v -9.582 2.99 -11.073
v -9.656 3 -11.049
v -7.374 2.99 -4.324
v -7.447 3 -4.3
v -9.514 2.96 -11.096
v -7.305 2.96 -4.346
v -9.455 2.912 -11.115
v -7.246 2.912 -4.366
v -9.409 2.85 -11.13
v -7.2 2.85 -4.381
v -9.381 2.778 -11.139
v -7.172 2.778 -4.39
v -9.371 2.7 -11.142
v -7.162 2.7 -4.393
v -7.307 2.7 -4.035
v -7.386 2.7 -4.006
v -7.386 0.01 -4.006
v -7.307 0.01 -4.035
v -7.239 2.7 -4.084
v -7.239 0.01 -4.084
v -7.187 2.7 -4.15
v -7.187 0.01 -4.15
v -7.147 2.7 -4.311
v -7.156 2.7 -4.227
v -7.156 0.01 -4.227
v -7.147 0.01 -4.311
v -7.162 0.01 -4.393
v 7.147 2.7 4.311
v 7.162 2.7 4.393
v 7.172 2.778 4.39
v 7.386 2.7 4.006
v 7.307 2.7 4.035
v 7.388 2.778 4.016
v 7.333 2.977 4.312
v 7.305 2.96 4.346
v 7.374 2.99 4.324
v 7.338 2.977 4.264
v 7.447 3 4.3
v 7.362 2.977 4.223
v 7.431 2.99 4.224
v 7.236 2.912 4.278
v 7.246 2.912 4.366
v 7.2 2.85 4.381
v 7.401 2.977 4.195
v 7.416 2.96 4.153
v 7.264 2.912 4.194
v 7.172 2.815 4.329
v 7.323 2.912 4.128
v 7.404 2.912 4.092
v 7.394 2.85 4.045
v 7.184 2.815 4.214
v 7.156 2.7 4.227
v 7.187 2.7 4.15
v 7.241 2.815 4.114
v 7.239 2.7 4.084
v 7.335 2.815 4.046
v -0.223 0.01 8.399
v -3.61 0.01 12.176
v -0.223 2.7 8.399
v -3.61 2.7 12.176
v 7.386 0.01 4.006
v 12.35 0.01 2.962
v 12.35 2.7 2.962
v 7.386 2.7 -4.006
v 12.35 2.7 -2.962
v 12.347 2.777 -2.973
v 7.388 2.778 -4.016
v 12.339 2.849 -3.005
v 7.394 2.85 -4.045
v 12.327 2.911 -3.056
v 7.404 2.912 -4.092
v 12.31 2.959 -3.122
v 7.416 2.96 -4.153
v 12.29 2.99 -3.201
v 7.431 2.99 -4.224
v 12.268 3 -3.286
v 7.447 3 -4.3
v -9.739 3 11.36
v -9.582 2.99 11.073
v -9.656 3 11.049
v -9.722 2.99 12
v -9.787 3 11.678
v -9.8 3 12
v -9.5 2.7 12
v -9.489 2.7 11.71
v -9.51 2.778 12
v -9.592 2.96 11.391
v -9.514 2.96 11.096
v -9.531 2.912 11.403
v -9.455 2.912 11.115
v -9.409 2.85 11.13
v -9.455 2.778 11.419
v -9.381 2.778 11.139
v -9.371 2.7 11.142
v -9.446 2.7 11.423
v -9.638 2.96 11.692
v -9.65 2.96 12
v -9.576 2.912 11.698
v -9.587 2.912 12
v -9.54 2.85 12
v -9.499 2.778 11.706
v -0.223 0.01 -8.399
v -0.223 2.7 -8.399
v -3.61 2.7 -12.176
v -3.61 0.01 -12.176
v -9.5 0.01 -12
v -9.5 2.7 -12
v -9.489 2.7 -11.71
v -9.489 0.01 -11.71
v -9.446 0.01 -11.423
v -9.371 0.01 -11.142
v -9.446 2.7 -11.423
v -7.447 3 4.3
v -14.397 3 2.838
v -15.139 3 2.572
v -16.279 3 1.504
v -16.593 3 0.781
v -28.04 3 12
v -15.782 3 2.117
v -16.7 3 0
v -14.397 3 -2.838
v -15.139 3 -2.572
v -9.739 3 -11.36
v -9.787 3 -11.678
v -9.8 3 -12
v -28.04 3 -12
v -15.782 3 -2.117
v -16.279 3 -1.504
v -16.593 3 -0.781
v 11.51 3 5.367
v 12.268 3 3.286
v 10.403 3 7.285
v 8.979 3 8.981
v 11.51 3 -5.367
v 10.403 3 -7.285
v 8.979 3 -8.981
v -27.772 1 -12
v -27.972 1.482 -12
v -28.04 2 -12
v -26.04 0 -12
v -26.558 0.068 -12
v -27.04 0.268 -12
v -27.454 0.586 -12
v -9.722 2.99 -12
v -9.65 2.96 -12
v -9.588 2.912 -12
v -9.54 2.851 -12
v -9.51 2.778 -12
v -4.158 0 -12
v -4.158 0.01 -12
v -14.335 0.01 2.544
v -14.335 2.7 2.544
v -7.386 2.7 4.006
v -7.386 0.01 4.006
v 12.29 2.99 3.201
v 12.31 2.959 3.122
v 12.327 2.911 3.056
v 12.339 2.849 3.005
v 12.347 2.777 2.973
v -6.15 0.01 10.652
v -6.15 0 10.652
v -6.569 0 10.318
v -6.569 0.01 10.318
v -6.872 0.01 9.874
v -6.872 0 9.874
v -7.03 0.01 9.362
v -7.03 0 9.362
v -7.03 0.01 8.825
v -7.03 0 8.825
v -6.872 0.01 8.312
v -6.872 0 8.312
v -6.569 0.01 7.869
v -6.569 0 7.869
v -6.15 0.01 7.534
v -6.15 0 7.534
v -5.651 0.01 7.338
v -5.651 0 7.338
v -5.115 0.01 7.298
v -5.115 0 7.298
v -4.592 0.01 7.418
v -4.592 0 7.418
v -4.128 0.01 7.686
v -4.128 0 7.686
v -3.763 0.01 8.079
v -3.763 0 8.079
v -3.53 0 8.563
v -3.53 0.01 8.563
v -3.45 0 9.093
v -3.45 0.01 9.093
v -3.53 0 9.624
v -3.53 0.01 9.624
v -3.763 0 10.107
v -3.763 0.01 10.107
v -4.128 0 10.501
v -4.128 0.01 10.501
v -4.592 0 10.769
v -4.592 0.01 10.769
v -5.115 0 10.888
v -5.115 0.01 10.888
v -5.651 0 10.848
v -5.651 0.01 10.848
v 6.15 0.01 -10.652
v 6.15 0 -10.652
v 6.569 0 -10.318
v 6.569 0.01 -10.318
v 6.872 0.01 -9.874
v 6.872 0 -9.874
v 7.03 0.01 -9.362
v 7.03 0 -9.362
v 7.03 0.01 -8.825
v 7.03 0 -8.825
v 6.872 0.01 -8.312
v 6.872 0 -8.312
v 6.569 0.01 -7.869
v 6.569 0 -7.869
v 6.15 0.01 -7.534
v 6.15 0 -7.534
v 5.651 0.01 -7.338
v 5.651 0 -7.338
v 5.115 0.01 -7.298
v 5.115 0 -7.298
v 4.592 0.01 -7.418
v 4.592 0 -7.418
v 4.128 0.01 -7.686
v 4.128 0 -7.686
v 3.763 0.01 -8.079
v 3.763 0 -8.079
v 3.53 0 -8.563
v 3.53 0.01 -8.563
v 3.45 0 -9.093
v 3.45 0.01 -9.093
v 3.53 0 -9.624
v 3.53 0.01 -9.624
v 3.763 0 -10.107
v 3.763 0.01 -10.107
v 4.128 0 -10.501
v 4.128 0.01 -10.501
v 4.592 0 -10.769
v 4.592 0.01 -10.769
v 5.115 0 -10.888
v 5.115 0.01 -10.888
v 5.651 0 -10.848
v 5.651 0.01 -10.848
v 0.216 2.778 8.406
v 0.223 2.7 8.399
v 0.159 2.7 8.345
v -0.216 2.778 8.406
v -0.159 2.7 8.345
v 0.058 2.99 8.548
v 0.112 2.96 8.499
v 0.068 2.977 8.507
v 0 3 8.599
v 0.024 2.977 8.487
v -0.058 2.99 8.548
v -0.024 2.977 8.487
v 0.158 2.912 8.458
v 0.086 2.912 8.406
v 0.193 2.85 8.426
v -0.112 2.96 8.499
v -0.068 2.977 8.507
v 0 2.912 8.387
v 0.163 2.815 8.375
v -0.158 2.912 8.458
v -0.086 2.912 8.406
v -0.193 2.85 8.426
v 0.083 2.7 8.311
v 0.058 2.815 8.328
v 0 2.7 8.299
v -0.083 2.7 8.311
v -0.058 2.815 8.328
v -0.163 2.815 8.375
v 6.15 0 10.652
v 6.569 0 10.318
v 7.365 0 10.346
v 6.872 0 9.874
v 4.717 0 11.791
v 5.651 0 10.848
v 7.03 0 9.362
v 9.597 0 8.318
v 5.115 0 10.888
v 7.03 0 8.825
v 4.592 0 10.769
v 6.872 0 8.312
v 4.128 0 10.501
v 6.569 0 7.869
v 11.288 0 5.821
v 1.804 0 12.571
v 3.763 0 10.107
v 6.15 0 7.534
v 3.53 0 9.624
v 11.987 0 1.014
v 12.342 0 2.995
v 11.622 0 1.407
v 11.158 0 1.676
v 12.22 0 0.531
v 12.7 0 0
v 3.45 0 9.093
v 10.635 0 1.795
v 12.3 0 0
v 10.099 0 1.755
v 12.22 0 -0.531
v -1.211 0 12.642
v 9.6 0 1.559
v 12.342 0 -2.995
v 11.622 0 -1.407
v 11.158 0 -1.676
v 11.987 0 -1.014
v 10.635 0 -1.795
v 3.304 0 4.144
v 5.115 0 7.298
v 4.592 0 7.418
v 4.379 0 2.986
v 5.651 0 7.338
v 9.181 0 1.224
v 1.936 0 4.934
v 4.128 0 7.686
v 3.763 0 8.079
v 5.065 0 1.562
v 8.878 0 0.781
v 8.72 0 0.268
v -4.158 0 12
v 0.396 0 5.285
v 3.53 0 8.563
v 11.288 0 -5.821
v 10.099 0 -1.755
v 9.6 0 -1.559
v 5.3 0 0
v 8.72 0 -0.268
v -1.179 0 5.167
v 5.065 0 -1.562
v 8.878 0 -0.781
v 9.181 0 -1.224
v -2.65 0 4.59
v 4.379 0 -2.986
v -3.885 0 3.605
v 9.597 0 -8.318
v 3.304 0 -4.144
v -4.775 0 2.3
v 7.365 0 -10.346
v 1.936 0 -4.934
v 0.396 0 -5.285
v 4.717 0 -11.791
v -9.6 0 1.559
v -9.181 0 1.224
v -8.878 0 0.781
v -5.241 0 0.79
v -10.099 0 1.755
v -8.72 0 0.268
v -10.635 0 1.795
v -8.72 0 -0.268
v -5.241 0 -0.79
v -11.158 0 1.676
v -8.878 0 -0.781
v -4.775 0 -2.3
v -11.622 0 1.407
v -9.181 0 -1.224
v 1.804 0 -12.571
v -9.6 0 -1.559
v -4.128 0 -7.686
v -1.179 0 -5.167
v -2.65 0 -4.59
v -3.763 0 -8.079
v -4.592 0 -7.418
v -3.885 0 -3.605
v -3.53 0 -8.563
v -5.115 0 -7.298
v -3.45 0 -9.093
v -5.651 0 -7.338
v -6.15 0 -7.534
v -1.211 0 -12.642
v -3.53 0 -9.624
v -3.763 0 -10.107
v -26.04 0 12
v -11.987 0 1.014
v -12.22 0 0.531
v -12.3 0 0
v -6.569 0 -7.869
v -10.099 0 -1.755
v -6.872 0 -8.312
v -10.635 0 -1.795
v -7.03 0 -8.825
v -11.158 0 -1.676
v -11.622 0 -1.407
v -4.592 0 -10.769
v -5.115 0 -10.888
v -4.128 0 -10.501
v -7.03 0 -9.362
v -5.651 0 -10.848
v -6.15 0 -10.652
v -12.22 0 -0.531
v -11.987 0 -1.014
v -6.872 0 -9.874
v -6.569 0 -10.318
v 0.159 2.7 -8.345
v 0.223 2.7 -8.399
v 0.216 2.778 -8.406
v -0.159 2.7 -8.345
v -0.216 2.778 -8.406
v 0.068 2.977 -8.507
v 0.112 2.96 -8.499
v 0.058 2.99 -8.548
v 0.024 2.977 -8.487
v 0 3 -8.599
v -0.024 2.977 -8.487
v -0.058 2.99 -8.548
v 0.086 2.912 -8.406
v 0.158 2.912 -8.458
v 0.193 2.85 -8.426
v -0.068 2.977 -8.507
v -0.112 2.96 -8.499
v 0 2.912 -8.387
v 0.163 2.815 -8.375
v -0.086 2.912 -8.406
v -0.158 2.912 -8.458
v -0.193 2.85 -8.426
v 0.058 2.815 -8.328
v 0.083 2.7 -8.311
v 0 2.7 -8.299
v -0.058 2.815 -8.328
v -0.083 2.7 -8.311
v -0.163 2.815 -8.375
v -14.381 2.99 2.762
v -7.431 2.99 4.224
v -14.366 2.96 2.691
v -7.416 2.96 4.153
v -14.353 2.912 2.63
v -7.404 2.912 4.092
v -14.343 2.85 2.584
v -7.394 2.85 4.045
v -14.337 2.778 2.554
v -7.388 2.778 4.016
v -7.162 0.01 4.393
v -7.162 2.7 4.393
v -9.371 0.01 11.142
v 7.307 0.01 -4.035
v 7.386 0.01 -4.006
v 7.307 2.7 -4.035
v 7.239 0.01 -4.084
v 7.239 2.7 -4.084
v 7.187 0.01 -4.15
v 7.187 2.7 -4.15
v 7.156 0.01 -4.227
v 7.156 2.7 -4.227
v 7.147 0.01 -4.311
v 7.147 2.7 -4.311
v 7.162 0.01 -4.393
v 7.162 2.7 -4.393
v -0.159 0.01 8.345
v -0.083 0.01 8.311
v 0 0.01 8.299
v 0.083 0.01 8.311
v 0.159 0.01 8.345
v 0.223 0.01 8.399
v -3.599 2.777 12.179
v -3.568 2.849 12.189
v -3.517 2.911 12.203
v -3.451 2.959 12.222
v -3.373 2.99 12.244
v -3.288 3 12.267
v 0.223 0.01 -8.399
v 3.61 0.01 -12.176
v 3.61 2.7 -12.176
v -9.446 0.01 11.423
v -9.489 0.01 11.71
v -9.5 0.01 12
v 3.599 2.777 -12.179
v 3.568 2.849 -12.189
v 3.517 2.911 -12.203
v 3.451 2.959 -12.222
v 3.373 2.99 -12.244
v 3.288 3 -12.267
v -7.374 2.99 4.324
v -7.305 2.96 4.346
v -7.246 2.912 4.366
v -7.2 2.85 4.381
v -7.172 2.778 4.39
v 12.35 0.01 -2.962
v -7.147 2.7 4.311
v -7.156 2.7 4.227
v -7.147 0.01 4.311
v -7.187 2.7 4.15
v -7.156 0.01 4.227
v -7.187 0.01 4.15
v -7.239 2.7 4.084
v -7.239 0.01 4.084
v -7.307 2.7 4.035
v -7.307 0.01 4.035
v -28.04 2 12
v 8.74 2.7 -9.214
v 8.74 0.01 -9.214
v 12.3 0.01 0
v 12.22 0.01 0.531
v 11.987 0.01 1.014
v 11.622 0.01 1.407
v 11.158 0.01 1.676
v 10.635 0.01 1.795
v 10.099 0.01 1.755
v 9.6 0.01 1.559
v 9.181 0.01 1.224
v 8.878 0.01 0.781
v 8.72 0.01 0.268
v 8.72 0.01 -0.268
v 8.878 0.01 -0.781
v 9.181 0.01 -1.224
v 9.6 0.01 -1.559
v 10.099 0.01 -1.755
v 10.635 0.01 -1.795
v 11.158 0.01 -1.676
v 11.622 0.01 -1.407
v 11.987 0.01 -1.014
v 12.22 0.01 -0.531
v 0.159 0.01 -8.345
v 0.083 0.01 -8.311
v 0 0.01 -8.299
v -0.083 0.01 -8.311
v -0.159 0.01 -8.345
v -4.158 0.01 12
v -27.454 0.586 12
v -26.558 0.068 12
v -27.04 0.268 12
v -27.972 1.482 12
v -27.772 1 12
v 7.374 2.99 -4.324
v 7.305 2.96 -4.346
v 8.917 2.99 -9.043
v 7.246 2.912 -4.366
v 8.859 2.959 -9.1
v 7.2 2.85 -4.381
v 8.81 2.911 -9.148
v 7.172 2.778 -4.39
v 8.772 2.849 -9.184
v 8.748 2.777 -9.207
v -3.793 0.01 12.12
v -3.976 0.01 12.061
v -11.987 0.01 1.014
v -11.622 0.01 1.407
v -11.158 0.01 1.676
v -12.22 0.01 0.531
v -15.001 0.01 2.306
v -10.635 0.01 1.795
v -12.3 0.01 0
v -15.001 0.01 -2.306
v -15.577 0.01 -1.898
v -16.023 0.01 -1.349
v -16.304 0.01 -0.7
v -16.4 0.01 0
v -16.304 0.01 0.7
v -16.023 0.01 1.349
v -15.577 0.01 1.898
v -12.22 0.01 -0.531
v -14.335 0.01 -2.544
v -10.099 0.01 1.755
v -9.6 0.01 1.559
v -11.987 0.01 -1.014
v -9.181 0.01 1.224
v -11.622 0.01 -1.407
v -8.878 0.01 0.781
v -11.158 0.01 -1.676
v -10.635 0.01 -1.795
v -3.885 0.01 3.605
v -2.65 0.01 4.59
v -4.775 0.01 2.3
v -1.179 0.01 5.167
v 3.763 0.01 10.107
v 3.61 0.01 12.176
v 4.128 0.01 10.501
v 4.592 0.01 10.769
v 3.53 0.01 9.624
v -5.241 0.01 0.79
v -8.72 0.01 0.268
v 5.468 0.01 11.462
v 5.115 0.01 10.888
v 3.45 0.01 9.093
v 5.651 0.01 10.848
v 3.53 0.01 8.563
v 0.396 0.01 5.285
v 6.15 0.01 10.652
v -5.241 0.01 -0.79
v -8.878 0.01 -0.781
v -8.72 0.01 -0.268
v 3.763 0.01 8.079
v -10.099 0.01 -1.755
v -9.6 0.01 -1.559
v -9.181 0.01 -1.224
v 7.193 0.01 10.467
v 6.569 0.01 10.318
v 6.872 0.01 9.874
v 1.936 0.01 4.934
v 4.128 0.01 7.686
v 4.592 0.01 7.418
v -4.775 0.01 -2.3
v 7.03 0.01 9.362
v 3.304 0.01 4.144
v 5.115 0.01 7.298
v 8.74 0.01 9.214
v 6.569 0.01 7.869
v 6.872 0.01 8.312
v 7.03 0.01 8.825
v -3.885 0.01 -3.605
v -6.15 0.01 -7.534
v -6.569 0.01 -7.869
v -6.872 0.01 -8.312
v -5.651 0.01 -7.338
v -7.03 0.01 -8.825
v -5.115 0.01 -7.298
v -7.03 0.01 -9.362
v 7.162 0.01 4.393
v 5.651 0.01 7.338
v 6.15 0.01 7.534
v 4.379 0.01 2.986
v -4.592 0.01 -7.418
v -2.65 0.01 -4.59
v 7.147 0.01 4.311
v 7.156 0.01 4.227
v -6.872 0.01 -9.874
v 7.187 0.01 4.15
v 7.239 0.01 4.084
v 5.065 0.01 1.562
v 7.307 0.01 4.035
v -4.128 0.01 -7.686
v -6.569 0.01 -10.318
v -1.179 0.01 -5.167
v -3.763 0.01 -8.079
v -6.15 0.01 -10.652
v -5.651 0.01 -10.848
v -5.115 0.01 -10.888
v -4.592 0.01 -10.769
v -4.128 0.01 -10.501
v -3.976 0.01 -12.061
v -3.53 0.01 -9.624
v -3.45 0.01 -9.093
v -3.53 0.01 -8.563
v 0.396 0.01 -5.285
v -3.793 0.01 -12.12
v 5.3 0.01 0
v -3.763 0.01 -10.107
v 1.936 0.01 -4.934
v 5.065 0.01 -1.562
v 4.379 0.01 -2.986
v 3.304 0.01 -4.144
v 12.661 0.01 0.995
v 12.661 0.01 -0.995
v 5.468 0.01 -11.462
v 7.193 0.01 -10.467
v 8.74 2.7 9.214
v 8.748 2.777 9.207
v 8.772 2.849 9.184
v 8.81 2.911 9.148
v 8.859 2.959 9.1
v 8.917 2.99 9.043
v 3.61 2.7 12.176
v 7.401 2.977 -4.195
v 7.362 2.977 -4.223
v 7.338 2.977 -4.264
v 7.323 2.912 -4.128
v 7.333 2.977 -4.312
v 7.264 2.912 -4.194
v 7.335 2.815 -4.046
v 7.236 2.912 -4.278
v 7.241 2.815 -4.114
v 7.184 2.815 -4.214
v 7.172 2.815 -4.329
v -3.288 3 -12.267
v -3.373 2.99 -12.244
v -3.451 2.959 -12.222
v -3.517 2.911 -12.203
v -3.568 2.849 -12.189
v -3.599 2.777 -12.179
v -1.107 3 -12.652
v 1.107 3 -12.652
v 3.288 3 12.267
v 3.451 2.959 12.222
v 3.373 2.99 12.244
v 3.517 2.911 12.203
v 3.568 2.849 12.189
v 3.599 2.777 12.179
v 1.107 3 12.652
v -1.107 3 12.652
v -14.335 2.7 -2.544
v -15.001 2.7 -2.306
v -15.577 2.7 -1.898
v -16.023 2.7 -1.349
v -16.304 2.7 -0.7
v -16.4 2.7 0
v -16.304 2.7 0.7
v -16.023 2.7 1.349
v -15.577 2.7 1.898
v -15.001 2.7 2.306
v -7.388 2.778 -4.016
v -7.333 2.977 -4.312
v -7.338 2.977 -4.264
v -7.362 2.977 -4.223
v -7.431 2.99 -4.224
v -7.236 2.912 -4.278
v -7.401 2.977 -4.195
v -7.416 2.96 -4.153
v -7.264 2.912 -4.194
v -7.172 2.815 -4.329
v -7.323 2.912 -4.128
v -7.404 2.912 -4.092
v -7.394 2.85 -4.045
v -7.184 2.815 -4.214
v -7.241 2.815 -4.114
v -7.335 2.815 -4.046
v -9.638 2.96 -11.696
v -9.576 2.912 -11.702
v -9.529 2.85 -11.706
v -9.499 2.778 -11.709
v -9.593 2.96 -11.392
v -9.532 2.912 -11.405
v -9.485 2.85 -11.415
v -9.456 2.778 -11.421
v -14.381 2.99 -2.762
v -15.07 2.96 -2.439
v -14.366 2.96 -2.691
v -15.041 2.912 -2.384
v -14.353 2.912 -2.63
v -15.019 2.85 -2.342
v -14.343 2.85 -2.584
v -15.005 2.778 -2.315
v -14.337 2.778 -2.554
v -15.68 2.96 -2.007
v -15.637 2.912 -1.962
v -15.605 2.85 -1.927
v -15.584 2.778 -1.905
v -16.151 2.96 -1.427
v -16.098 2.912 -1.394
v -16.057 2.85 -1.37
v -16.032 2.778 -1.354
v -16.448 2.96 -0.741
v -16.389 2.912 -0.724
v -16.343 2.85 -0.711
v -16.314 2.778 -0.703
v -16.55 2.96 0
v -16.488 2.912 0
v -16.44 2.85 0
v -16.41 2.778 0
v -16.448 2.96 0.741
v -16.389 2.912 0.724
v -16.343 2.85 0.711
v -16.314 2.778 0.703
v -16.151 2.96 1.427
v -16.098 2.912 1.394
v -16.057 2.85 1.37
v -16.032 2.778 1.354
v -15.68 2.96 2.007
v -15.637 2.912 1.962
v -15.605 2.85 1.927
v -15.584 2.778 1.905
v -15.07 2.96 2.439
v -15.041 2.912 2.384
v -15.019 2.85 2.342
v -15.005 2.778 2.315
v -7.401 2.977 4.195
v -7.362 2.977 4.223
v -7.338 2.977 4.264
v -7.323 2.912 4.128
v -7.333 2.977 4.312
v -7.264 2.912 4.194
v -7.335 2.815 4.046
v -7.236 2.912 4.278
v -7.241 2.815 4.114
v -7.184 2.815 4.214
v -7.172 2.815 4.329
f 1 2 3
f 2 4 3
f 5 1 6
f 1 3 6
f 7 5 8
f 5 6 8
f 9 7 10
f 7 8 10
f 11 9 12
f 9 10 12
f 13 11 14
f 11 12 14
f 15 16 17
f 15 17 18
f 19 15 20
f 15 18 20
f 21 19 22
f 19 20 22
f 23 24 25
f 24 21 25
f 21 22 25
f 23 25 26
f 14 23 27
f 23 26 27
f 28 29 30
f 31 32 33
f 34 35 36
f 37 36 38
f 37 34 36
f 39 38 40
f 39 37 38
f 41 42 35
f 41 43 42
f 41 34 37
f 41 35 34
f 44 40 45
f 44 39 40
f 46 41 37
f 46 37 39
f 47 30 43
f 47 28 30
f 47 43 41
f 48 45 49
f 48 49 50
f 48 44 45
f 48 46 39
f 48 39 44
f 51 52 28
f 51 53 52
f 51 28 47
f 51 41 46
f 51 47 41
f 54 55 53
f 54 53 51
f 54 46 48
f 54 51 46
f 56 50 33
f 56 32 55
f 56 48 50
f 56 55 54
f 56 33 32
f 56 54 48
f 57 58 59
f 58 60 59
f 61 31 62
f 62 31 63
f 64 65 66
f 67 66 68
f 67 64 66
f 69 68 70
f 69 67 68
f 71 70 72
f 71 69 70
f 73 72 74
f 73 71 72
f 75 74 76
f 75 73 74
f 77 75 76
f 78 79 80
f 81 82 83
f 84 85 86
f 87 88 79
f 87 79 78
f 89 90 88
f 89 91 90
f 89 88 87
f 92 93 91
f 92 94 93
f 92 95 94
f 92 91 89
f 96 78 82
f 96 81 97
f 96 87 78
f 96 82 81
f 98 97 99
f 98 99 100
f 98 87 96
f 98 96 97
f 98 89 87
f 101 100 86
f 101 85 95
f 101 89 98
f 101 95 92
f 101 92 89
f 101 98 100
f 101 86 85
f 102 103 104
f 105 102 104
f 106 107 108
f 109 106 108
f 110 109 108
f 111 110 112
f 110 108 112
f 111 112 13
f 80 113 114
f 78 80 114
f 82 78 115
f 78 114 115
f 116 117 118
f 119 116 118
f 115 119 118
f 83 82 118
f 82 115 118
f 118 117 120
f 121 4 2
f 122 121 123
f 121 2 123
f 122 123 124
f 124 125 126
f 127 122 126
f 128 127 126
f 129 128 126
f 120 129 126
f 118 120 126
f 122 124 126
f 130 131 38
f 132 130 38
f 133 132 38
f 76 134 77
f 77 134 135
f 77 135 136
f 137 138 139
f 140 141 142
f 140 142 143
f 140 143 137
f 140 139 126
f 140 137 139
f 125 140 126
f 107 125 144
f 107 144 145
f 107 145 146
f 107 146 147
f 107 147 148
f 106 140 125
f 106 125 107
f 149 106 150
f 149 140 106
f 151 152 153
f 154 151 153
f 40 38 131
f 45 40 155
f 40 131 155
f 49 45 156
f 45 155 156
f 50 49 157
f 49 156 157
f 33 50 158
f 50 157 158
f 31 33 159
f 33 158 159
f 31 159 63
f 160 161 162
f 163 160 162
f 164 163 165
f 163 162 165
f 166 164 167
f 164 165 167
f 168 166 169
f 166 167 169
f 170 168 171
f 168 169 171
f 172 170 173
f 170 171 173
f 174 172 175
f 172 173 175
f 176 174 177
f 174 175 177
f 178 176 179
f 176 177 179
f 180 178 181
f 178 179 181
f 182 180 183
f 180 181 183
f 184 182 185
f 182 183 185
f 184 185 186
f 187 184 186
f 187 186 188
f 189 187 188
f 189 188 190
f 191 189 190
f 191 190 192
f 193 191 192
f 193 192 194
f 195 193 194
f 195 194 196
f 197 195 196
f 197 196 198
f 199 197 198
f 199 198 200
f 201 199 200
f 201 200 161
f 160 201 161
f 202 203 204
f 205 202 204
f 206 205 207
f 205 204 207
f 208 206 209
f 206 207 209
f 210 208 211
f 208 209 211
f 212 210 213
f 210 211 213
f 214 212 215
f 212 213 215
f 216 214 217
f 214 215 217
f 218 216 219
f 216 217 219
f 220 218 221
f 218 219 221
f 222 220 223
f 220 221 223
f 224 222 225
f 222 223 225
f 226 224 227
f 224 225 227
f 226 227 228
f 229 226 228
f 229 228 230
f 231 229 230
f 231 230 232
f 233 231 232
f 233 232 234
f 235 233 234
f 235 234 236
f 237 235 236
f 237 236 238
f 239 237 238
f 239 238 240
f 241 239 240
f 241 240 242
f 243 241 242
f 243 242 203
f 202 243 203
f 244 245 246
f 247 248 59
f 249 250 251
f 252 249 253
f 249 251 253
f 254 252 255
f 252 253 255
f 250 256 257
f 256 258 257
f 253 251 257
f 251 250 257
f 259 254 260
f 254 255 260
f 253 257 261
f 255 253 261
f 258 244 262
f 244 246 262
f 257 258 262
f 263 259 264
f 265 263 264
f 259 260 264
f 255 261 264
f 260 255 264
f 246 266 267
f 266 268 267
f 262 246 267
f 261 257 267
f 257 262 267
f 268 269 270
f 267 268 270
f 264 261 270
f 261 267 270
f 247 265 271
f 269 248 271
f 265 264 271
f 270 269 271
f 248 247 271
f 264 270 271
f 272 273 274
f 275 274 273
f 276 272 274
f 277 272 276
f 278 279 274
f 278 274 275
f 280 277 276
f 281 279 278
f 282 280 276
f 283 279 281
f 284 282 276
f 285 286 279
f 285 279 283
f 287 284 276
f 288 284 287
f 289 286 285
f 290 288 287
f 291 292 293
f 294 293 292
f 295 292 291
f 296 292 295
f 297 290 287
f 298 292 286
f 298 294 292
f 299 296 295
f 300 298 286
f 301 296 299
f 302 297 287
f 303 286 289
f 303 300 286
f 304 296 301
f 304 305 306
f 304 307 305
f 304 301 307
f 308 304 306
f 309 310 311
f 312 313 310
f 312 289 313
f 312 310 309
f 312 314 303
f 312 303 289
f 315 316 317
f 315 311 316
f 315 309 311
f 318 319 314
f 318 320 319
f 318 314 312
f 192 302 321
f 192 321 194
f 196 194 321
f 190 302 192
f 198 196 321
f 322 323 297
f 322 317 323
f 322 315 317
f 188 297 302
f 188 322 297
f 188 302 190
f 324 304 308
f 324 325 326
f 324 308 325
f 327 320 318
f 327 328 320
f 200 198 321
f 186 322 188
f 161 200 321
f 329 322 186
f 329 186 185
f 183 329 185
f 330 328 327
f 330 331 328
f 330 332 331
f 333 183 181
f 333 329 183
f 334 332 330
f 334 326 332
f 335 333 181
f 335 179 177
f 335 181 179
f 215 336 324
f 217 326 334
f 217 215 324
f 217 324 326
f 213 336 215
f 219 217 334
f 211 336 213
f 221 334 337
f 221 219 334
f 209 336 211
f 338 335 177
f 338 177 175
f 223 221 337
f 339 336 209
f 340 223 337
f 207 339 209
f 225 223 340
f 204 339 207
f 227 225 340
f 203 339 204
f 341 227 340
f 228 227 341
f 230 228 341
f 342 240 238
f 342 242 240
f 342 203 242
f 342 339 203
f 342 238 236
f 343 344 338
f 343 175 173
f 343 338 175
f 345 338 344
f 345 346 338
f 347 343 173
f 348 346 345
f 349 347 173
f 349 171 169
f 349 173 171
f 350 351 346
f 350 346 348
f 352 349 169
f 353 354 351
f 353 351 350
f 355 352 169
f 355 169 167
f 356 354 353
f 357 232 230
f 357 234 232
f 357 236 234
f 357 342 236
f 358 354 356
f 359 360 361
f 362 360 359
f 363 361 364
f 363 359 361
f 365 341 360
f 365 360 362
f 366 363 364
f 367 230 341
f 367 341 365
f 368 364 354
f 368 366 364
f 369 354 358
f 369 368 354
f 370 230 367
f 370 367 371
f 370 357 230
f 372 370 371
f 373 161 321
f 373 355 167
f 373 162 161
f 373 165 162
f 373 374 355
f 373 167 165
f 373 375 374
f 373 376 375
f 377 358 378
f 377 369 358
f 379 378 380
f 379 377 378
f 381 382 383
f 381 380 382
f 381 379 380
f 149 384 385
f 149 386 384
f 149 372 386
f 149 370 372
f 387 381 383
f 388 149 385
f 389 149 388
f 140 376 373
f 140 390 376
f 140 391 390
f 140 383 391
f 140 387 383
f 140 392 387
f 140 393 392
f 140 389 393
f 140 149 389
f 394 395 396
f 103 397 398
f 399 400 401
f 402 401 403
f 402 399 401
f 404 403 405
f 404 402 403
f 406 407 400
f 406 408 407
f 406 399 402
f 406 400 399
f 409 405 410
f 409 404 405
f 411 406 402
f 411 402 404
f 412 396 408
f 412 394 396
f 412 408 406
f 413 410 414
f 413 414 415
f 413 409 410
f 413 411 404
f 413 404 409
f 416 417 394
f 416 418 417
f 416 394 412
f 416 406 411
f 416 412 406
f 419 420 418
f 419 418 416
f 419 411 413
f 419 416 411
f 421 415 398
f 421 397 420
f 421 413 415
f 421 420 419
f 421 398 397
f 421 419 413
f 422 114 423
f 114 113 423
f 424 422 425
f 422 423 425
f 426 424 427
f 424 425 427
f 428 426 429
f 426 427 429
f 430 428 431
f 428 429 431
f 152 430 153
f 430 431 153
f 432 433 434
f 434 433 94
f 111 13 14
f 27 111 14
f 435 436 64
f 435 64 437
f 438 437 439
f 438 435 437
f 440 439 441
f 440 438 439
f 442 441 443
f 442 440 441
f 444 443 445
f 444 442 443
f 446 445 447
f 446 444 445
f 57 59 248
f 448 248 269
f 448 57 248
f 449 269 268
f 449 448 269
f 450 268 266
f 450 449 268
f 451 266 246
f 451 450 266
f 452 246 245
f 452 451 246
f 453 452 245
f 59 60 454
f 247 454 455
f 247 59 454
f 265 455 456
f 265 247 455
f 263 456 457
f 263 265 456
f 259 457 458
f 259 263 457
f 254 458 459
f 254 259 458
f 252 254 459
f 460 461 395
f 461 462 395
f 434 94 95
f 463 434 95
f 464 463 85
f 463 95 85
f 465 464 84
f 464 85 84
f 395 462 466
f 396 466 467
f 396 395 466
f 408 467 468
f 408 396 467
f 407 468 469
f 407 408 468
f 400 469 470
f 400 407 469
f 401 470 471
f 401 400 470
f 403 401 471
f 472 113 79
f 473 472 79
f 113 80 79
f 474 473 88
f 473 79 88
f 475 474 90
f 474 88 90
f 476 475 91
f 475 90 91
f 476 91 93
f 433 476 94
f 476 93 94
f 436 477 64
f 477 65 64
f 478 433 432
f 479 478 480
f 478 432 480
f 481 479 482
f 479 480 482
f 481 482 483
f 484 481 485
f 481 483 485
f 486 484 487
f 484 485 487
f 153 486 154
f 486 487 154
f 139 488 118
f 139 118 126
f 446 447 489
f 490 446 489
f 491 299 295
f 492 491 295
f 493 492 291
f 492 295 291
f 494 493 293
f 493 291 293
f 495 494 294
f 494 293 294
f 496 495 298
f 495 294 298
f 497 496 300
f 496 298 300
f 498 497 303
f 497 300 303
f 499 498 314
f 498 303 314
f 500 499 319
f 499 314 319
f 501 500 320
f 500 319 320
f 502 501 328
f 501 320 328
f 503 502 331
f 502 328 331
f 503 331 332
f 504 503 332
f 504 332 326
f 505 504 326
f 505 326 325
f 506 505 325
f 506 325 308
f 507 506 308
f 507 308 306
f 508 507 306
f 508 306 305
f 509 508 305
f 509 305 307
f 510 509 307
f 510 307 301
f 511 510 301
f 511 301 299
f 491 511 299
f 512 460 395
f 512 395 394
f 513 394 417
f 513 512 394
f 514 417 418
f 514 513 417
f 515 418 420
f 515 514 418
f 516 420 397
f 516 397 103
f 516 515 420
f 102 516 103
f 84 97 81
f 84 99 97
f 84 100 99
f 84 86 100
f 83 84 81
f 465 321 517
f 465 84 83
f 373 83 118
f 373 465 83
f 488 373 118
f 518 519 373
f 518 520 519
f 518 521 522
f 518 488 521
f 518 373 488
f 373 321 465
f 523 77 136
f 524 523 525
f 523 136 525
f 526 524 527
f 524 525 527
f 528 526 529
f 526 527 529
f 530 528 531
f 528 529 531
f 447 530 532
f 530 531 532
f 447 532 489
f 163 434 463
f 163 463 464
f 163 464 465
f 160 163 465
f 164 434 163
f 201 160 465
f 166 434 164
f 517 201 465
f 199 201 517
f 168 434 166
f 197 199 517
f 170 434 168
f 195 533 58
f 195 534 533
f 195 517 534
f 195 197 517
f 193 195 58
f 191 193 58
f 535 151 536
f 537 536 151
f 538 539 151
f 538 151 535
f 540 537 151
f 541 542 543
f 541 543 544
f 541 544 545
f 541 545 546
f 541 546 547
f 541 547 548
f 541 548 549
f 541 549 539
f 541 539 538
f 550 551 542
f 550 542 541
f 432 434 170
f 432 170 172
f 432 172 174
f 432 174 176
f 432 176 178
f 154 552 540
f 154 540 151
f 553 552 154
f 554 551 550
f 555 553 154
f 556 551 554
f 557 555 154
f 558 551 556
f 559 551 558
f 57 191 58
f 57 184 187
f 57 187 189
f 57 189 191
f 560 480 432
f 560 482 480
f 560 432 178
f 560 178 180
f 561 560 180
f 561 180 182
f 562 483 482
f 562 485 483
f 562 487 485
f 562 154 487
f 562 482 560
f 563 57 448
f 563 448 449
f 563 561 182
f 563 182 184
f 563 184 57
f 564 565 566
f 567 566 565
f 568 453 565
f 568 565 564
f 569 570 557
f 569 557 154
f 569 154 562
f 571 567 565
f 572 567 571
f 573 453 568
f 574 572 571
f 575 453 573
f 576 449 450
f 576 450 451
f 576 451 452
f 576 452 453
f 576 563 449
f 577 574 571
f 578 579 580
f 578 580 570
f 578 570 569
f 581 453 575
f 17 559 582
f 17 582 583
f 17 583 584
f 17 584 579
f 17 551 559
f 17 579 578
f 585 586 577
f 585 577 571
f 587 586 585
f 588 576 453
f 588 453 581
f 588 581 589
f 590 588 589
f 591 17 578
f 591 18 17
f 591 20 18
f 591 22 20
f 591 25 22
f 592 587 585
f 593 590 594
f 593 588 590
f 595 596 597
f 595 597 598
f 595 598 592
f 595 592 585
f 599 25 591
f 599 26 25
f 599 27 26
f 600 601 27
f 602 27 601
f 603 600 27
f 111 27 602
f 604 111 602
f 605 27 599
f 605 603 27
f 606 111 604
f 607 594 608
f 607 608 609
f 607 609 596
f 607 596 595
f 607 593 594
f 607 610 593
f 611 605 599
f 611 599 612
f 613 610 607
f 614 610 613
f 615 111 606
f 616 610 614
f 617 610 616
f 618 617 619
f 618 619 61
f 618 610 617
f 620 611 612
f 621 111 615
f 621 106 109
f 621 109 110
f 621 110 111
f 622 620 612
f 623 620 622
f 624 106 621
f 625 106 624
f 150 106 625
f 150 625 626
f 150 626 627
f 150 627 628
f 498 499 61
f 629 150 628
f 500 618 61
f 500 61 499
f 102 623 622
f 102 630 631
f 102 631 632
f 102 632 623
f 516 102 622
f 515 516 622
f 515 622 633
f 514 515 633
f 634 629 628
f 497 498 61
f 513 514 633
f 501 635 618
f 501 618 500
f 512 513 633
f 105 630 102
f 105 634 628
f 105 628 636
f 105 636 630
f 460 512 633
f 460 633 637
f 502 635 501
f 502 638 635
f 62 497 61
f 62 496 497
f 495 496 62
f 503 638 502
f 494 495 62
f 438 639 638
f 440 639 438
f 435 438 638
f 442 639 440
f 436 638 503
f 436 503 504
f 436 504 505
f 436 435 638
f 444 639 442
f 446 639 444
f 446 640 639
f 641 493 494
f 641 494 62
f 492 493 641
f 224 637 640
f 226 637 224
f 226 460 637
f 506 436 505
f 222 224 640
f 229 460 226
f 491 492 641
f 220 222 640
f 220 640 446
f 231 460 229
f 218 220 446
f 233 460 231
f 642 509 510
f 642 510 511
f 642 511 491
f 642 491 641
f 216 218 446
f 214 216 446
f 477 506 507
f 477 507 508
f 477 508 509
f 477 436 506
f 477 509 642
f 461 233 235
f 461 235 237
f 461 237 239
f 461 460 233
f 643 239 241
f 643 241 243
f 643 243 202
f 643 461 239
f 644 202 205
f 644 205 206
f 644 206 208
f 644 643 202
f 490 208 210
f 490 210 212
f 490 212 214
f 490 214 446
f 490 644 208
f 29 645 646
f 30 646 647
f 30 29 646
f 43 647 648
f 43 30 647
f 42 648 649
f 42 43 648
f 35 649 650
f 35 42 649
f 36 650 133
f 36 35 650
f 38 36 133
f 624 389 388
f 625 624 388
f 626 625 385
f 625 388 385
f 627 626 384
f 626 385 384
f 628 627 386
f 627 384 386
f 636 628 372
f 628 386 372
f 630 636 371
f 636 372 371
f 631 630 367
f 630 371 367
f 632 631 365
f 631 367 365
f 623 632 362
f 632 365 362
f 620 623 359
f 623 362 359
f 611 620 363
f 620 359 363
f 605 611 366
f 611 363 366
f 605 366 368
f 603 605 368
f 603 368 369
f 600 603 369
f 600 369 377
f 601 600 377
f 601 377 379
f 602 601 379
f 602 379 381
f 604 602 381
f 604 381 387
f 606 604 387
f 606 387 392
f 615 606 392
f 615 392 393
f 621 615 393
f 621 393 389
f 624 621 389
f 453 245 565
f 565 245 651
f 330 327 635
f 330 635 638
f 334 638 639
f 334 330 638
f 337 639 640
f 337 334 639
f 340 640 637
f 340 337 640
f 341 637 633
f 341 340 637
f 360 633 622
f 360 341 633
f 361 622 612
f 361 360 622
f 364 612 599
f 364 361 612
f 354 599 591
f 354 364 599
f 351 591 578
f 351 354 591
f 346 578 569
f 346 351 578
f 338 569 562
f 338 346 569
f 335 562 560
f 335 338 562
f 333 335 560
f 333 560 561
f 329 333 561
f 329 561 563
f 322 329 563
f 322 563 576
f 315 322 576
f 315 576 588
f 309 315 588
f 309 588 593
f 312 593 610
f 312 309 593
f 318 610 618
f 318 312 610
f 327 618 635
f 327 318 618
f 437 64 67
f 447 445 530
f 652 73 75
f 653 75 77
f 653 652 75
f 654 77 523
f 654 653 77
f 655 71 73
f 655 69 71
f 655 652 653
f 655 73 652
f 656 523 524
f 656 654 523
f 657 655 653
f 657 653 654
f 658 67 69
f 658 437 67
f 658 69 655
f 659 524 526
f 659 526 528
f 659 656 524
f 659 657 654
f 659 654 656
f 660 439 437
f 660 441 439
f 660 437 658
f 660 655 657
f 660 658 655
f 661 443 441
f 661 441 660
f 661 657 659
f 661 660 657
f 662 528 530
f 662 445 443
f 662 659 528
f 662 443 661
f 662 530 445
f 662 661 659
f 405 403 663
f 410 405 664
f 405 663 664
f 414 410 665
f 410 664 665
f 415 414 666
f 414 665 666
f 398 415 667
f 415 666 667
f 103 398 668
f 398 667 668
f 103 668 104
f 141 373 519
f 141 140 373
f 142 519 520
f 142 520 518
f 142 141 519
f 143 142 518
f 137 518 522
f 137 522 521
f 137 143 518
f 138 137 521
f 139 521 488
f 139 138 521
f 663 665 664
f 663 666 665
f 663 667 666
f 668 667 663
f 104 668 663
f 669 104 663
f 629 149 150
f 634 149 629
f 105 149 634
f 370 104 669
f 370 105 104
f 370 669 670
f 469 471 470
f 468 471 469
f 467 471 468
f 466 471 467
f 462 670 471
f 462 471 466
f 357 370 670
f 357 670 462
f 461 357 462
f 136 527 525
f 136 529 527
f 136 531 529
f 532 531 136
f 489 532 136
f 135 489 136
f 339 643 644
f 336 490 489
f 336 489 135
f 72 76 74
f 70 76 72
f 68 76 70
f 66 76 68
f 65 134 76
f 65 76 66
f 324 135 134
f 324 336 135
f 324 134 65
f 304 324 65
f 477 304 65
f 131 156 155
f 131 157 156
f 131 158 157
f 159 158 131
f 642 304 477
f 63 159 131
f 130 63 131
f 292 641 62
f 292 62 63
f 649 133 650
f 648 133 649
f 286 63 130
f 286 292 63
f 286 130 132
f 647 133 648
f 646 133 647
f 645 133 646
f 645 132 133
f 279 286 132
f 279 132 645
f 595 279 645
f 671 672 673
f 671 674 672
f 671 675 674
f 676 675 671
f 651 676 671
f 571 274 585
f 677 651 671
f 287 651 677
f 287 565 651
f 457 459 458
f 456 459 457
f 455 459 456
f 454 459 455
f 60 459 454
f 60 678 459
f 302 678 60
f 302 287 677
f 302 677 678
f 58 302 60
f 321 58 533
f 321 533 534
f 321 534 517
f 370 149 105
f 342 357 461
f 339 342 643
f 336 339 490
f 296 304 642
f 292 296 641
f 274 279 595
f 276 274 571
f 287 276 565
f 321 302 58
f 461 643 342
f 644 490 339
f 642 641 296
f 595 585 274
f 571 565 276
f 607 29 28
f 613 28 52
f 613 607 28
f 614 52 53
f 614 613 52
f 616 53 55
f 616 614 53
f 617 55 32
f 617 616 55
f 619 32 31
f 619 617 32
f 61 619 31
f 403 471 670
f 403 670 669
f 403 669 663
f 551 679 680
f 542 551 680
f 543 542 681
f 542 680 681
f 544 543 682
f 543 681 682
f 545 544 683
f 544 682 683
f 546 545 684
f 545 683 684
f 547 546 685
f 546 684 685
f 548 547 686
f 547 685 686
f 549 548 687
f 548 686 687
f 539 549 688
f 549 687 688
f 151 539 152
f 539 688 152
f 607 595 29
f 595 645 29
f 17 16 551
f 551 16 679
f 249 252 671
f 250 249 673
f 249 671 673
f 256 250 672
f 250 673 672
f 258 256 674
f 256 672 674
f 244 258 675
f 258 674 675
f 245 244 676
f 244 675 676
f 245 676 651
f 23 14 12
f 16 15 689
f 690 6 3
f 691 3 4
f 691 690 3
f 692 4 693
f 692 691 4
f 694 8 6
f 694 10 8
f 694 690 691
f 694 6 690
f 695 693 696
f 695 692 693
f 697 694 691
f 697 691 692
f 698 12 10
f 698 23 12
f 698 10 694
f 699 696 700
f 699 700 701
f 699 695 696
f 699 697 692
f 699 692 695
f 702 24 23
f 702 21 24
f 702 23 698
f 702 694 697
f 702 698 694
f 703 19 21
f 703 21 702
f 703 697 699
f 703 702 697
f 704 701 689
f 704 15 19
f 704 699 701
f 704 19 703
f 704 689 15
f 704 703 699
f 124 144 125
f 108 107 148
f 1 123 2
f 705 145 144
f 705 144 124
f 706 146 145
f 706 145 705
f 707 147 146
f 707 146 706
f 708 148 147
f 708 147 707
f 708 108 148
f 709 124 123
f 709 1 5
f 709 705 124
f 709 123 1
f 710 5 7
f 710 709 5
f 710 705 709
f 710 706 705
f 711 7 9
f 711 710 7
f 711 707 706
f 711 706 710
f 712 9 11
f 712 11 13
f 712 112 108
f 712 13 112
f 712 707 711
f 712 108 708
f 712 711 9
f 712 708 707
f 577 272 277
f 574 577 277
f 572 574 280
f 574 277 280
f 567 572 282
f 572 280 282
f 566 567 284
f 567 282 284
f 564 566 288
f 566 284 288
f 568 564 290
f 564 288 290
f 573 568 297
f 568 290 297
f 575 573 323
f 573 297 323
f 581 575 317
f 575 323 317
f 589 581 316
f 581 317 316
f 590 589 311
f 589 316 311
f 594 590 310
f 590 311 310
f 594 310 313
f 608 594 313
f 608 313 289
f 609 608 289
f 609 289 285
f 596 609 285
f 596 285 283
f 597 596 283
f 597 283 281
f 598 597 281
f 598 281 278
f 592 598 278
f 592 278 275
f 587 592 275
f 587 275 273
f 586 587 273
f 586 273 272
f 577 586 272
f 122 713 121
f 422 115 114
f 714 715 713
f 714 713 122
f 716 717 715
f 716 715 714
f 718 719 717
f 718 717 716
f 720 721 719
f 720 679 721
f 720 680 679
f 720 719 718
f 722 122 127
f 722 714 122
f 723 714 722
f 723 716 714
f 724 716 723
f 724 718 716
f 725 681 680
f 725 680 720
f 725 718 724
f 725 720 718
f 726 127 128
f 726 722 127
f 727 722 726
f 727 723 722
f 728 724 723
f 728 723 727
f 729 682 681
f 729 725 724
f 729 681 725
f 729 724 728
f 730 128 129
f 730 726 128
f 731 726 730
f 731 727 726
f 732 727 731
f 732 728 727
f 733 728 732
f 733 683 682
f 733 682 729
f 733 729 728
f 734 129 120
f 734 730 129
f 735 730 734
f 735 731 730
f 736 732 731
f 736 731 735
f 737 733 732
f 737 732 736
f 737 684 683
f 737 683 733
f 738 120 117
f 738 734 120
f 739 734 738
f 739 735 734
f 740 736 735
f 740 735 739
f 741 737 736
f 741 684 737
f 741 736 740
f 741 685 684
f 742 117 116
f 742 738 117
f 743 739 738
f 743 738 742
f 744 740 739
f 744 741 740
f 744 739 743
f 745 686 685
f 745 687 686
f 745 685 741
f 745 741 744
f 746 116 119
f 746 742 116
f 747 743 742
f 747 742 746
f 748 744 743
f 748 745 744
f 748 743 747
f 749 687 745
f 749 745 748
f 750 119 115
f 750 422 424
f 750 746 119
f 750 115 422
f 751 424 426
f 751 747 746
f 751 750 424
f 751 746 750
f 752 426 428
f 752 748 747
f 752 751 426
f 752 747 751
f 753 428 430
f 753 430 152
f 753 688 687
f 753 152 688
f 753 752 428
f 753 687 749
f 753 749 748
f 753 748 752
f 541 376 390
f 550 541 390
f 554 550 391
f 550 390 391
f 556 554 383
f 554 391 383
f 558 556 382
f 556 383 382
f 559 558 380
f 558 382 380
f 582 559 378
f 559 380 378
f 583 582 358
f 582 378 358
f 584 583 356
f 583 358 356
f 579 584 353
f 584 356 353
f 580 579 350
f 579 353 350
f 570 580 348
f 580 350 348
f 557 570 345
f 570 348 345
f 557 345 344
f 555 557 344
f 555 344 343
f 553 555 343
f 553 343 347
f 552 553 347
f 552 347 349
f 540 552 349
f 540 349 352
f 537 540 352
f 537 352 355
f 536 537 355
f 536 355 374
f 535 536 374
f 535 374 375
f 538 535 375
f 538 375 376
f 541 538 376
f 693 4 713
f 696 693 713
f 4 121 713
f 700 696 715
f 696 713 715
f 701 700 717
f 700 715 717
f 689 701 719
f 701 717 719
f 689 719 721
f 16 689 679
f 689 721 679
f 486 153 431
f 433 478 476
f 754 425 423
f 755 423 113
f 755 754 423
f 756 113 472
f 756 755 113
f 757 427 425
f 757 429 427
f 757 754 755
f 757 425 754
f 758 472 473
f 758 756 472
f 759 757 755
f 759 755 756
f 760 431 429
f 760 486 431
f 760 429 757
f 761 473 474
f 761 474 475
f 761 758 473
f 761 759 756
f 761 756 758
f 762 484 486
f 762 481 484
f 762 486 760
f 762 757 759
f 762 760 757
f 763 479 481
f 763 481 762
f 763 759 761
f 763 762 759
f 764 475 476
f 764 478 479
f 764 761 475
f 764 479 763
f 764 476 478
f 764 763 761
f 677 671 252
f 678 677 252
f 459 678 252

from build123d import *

# Parameters (mm, degrees)
CROQUIS1_R              = 5.3
SALIENTE_EXTRUIR1_DEPTH = 3
CORTAR_EXTRUIR2_DEPTH   = 2.99
REDONDEO1_R             = 2
REDONDEO2_R             = 0.3
CROQUIS3_R              = 1.8
CORTAR_EXTRUIR3_DEPTH   = 10
MATRIZC1_COUNT          = 6


with BuildPart() as part:
    # Croquis1 → Saliente-Extruir1 (new body)
    with BuildSketch(Plane(origin=(0, 0, 0), x_dir=(1, 0, 0), z_dir=(0, 1, 0))):
        with BuildLine():
            Line((-28.04, 12), (-4.158124577, 12))
            ThreePointArc((-4.158124577, 12), (12.7, 0), (-4.158124577, -12))
            Line((-4.158124577, -12), (-28.04, -12))
            Line((-28.04, -12), (-28.04, 12))
        make_face()
        Circle(CROQUIS1_R, mode=Mode.SUBTRACT)
    extrude(amount=SALIENTE_EXTRUIR1_DEPTH)

    # Croquis2 → Cortar-Extruir2 (cut)
    with BuildSketch(Plane(origin=(0, 3, 0), x_dir=(1, 0, 0), z_dir=(0, 1, 0))):
        with BuildLine():
            Line((-14.335178977, -2.544323773), (-7.058107041, -4.075))
            Line((-7.058107041, -4.075), (-9.371038511, -11.142467275))
            ThreePointArc((-9.371038511, -11.142467275), (-8.2, -14.202816622), (-4.964140465, -13.686791048))
            Line((-4.964140465, -13.686791048), (0, -8.15))
            Line((0, -8.15), (4.964140465, -13.686791048))
            ThreePointArc((4.964140465, -13.686791048), (8.2, -14.202816622), (9.371038511, -11.142467275))
            Line((9.371038511, -11.142467275), (7.058107041, -4.075))
            Line((7.058107041, -4.075), (14.335178977, -2.544323773))
            ThreePointArc((14.335178977, -2.544323773), (16.4, 0), (14.335178977, 2.544323773))
            Line((14.335178977, 2.544323773), (7.058107041, 4.075))
            Line((7.058107041, 4.075), (9.371038511, 11.142467275))
            ThreePointArc((9.371038511, 11.142467275), (8.2, 14.202816622), (4.964140465, 13.686791048))
            Line((4.964140465, 13.686791048), (0, 8.15))
            Line((0, 8.15), (-4.964140465, 13.686791048))
            ThreePointArc((-4.964140465, 13.686791048), (-8.2, 14.202816622), (-9.371038511, 11.142467275))
            Line((-9.371038511, 11.142467275), (-7.058107041, 4.075))
            Line((-7.058107041, 4.075), (-14.335178977, 2.544323773))
            ThreePointArc((-14.335178977, 2.544323773), (-16.4, 0), (-14.335178977, -2.544323773))
        make_face()
    extrude(amount=-CORTAR_EXTRUIR2_DEPTH, mode=Mode.SUBTRACT)

    # Redondeo1
    redondeo1_edges = [part.edges().sort_by_distance(p)[0] for p in [
        (-28.04, 0, 0),
    ]]
    fillet(redondeo1_edges, radius=REDONDEO1_R)

    # Redondeo2
    redondeo2_edges = [part.edges().sort_by_distance(p)[0] for p in [
        (0, 1.505, -8.15),
        (7.058107041, 1.505, -4.075),
        (7.058107041, 1.505, 4.075),
        (0, 1.505, 8.15),
        (1.804886558, 3, 10.163093668),
        (7.899054019, 3, 6.644624444),
        (9.703940577, 3, 3.518469224),
        (9.703940577, 3, -3.518469224),
        (7.899054019, 3, -6.644624444),
        (1.804886558, 3, -10.163093668),
        (-1.804886558, 3, -10.163093668),
        (-9.471290512, 3, -11.565838876),
        (-8.214572776, 3, -7.608733638),
        (-10.696643009, 3, -3.309661887),
        (-16.4, 3, 0),
        (-10.696643009, 3, 3.309661887),
        (-8.214572776, 3, 7.608733638),
        (-9.471290512, 3, 11.565838876),
        (-1.804886558, 3, 10.163093668),
        (-7.058107041, 1.505, -4.075),
        (-7.058107041, 1.505, 4.075),
    ]]
    fillet(redondeo2_edges, radius=REDONDEO2_R)

    # Croquis3 → Cortar-Extruir3 (cut)
    with BuildSketch(Plane.XZ):
        with Locations((10.5, 0)):
            Circle(CROQUIS3_R)
    cortar_extruir3 = extrude(amount=-CORTAR_EXTRUIR3_DEPTH, mode=Mode.SUBTRACT)

    # MatrizC1: Cortar-Extruir3 ×6 about axis
    matrizc1_axis = Axis((0, 0, 0), (0, 1, 0))
    for i in range(1, MATRIZC1_COUNT):
        add(cortar_extruir3.rotate(matrizc1_axis, i * 360 / MATRIZC1_COUNT), mode=Mode.SUBTRACT)


solid = part.part
